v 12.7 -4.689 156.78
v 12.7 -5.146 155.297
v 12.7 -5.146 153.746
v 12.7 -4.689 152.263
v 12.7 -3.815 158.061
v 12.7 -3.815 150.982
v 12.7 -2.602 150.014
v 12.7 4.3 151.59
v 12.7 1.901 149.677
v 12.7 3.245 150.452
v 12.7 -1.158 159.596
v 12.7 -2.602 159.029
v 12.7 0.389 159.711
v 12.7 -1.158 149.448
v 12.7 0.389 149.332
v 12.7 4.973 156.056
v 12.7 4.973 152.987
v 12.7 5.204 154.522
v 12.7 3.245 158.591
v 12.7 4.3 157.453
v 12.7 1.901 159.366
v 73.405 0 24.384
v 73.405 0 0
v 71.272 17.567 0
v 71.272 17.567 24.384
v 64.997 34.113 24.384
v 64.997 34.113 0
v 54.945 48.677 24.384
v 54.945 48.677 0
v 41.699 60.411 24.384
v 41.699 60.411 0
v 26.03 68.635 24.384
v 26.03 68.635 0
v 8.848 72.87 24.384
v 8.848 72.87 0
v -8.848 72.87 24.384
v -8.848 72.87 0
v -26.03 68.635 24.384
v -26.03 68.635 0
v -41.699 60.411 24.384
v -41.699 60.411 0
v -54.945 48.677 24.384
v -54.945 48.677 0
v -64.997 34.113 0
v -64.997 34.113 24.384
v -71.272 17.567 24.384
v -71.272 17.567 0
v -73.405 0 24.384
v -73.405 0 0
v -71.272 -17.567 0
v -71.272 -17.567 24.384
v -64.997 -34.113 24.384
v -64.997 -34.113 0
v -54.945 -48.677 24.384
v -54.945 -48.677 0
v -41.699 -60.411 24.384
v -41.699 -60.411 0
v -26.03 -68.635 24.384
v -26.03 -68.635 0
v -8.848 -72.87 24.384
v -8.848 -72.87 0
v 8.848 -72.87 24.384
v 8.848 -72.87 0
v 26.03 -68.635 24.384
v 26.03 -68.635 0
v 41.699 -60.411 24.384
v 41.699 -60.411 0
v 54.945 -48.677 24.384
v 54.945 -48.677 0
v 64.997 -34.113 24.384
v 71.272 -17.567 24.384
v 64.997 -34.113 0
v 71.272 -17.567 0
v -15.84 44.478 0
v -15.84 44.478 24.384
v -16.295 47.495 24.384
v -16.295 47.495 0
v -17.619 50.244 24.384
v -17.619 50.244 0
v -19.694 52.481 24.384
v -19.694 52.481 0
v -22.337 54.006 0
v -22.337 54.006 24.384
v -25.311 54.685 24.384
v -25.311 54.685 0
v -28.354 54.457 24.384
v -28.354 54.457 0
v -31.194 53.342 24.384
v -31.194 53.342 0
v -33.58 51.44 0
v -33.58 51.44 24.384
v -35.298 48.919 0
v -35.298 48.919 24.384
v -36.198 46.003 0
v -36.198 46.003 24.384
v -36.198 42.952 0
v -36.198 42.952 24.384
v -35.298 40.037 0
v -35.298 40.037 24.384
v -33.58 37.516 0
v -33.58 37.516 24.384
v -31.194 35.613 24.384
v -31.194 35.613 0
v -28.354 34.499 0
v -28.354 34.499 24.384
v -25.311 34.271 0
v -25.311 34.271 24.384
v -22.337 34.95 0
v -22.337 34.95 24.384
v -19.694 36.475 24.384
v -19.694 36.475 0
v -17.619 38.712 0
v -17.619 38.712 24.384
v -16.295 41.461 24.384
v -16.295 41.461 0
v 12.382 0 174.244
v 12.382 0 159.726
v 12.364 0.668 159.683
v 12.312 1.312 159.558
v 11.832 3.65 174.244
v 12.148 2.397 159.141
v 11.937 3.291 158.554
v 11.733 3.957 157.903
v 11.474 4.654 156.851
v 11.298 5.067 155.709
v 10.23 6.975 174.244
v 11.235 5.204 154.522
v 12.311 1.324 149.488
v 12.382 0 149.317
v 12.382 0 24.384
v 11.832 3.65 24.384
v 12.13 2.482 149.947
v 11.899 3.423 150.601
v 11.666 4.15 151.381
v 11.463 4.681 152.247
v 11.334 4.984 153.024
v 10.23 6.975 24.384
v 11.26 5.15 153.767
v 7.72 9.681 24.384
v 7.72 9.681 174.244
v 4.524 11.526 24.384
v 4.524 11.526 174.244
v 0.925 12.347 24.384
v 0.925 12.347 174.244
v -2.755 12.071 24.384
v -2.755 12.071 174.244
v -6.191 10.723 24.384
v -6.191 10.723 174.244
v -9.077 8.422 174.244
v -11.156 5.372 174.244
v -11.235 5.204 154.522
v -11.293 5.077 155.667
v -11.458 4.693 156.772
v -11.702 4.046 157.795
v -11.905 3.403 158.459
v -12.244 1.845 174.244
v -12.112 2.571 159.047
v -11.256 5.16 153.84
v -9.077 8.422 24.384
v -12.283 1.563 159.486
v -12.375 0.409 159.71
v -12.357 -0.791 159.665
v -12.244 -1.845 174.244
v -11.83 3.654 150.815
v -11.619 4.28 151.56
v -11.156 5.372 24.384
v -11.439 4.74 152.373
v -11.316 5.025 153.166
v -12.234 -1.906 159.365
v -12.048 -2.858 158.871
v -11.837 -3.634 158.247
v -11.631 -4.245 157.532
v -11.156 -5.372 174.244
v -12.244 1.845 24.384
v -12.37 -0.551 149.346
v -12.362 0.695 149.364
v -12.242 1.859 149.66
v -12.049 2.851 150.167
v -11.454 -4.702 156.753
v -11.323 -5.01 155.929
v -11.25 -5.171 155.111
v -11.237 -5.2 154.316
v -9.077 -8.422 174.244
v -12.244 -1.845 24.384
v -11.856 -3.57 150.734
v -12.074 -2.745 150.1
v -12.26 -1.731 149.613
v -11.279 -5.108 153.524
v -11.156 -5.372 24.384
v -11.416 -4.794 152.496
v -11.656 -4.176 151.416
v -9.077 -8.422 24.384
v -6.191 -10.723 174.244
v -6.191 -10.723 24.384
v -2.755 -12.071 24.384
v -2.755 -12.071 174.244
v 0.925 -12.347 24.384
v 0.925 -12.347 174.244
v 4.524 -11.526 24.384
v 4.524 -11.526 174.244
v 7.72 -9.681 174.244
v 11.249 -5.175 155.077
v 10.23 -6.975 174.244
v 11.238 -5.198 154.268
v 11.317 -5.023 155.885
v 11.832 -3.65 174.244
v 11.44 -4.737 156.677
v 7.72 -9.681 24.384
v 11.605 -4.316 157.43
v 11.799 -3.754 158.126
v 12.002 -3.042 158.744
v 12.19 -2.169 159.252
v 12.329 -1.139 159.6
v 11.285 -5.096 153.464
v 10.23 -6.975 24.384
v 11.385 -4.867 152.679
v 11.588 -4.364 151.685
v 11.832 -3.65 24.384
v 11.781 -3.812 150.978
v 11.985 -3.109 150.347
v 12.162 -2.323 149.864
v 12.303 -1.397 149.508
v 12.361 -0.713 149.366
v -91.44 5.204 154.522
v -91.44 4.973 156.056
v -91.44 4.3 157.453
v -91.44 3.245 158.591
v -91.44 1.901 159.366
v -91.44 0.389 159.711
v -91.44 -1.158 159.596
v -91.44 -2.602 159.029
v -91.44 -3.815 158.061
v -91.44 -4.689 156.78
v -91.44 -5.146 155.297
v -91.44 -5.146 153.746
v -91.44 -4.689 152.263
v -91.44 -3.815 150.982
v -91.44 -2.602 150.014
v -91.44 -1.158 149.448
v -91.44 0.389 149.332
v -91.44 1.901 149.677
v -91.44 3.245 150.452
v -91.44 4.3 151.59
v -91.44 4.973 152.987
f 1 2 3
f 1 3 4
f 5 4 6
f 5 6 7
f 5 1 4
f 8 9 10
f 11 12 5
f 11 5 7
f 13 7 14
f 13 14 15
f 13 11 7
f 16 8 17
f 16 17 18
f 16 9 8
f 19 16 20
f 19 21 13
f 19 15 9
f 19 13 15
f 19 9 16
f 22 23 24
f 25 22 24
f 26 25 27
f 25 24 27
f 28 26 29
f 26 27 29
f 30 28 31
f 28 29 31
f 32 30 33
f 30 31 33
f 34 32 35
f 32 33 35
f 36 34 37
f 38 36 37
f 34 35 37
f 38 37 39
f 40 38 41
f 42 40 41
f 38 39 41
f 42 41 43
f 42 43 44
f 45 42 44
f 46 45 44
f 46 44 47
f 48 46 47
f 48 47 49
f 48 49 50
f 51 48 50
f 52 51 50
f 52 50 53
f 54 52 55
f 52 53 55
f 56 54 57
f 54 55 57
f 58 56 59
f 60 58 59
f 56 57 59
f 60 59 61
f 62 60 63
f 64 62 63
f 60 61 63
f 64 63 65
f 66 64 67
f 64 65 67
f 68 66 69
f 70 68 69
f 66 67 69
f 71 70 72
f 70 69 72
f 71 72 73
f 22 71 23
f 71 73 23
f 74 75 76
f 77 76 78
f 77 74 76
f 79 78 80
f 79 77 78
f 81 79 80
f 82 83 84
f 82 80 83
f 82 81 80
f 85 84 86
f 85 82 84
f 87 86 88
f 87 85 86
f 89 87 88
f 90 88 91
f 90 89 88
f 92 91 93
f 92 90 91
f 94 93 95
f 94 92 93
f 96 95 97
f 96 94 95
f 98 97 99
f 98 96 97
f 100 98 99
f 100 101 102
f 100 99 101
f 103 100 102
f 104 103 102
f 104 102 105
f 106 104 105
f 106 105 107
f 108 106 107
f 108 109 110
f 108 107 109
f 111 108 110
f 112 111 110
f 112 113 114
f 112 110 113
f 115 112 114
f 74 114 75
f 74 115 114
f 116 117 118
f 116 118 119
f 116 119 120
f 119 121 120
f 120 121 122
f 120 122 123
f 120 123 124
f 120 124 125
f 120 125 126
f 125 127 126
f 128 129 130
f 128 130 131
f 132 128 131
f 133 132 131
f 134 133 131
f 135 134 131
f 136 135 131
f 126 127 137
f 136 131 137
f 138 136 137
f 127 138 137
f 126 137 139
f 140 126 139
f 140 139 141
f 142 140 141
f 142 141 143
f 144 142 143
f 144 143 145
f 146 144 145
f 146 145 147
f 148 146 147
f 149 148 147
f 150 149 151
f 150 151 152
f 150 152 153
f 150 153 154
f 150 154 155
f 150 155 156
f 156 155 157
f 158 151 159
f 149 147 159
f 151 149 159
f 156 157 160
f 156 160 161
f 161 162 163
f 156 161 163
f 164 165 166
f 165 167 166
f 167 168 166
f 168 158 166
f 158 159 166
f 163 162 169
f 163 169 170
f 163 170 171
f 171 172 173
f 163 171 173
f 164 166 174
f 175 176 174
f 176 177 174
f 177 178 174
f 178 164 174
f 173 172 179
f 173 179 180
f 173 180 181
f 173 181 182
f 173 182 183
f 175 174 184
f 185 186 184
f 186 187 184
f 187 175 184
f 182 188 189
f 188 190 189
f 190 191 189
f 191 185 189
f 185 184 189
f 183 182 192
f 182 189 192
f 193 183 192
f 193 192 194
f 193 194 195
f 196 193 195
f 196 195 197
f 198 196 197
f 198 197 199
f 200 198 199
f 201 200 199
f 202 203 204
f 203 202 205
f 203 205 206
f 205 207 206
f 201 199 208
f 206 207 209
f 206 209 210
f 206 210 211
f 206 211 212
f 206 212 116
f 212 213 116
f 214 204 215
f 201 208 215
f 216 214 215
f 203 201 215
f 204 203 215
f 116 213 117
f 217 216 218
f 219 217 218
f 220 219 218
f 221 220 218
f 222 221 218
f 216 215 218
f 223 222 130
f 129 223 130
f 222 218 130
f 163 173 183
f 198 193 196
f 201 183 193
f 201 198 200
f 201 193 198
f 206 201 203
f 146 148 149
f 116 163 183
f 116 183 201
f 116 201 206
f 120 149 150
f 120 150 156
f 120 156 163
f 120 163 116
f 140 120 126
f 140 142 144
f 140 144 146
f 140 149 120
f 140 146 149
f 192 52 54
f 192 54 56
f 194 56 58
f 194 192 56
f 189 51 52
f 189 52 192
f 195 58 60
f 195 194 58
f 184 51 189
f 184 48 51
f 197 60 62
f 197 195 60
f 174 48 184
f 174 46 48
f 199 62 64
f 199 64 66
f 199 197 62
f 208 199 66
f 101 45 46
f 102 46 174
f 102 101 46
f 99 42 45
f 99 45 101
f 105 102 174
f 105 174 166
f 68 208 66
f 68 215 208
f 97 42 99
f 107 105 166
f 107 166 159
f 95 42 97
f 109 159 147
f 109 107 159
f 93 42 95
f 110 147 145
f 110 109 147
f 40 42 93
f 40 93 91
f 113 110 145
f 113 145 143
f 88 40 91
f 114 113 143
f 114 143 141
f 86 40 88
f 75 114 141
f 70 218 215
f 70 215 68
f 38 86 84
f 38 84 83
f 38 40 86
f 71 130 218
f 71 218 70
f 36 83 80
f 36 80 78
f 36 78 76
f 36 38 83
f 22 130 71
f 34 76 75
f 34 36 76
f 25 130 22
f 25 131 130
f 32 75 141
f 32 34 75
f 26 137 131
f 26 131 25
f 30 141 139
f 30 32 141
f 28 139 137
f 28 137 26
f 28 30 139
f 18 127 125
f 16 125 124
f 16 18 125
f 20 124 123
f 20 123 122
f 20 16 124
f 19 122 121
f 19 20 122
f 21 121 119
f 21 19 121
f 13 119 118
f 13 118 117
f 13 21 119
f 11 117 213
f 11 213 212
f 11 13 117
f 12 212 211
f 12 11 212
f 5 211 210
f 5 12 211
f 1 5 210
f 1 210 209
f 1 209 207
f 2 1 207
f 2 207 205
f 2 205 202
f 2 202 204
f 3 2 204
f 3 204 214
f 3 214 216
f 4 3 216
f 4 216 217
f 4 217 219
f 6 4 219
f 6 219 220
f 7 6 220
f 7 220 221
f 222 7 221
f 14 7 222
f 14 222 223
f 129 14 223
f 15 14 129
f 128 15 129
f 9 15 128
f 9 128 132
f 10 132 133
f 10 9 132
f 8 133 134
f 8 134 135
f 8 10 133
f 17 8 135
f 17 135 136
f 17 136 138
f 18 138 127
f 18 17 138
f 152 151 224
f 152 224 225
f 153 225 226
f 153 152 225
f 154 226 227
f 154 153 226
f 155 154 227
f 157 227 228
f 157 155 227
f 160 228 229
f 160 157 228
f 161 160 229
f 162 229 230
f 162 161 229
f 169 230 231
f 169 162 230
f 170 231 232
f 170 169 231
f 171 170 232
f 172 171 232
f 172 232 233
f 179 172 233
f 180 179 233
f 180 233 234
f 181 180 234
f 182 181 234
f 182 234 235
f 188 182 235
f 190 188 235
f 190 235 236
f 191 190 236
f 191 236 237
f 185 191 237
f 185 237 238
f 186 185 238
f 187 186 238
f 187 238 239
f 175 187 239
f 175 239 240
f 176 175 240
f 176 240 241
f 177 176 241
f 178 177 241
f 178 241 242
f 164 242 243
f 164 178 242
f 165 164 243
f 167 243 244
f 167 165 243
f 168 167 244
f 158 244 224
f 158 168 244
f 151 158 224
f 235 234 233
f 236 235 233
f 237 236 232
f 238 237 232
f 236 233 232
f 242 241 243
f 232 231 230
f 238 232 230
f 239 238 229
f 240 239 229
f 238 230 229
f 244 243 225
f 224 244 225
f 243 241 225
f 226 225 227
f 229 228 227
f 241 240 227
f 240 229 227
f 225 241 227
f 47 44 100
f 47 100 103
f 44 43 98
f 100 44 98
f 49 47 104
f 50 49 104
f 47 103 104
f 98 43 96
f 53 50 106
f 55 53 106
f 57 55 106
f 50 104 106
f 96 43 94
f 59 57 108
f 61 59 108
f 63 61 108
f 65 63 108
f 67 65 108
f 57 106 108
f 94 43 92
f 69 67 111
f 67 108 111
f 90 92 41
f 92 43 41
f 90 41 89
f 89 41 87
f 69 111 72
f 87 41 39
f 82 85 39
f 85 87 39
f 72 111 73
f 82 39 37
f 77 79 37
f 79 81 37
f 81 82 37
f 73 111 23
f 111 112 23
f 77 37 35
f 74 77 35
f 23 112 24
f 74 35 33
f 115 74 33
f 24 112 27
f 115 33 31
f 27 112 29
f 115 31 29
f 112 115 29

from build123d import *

# Parameters (mm, degrees)
F0_R     = 12.381892
F1_DEPTH = 174.244
F3_R     = 5.204488
F4_DEPTH = 104.14
F5_R     = 73.405341
F6_DEPTH = 24.384
F7_R     = 10.235871
F8_DEPTH = 25.4


with BuildPart() as f1:
    # F0 (on Top) → F1 (new body)
    with BuildSketch(Plane.XY):
        Circle(F0_R)
    extrude(amount=F1_DEPTH)

    # F3 (on offset) → F4 (join)
    with BuildSketch(Plane.YZ.offset(12.7)):
        with Locations((0, 154.521525)):
            Circle(F3_R)
    extrude(amount=-F4_DEPTH)

    # F5 (on Top) → F6 (join)
    with BuildSketch(Plane.XY):
        Circle(F5_R)
    extrude(amount=F6_DEPTH)

    # F7 (on Top) → F8 (cut)
    with BuildSketch(Plane.XY):
        with Locations((-26.076123, 44.477817)):
            Circle(F7_R)
    extrude(amount=F8_DEPTH, mode=Mode.SUBTRACT)


solid = f1.part
